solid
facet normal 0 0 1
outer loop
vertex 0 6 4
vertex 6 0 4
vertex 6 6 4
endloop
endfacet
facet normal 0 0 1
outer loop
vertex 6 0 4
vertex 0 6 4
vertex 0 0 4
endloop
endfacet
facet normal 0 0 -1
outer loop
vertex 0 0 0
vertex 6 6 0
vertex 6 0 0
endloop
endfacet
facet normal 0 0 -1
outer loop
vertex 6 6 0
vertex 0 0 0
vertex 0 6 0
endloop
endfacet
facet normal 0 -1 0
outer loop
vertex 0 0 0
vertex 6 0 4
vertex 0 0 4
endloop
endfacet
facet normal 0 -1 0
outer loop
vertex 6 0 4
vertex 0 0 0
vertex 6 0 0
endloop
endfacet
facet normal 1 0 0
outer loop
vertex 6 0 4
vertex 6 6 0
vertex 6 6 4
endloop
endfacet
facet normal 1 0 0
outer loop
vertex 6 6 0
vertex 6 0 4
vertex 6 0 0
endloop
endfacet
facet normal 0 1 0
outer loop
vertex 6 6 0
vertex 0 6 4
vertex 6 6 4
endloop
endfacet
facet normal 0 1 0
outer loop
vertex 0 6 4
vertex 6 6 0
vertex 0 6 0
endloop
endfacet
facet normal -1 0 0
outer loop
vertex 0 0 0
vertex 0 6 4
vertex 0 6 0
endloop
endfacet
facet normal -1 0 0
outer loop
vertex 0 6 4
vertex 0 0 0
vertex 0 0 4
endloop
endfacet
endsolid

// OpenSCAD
// Construct: string ops — str()/concat()/len() derive a dimension.
label = str("part-", 7);
tags = concat(["a", "b"], ["c", "d"]);
cube([len(label), len(tags) + 2, 4]);
